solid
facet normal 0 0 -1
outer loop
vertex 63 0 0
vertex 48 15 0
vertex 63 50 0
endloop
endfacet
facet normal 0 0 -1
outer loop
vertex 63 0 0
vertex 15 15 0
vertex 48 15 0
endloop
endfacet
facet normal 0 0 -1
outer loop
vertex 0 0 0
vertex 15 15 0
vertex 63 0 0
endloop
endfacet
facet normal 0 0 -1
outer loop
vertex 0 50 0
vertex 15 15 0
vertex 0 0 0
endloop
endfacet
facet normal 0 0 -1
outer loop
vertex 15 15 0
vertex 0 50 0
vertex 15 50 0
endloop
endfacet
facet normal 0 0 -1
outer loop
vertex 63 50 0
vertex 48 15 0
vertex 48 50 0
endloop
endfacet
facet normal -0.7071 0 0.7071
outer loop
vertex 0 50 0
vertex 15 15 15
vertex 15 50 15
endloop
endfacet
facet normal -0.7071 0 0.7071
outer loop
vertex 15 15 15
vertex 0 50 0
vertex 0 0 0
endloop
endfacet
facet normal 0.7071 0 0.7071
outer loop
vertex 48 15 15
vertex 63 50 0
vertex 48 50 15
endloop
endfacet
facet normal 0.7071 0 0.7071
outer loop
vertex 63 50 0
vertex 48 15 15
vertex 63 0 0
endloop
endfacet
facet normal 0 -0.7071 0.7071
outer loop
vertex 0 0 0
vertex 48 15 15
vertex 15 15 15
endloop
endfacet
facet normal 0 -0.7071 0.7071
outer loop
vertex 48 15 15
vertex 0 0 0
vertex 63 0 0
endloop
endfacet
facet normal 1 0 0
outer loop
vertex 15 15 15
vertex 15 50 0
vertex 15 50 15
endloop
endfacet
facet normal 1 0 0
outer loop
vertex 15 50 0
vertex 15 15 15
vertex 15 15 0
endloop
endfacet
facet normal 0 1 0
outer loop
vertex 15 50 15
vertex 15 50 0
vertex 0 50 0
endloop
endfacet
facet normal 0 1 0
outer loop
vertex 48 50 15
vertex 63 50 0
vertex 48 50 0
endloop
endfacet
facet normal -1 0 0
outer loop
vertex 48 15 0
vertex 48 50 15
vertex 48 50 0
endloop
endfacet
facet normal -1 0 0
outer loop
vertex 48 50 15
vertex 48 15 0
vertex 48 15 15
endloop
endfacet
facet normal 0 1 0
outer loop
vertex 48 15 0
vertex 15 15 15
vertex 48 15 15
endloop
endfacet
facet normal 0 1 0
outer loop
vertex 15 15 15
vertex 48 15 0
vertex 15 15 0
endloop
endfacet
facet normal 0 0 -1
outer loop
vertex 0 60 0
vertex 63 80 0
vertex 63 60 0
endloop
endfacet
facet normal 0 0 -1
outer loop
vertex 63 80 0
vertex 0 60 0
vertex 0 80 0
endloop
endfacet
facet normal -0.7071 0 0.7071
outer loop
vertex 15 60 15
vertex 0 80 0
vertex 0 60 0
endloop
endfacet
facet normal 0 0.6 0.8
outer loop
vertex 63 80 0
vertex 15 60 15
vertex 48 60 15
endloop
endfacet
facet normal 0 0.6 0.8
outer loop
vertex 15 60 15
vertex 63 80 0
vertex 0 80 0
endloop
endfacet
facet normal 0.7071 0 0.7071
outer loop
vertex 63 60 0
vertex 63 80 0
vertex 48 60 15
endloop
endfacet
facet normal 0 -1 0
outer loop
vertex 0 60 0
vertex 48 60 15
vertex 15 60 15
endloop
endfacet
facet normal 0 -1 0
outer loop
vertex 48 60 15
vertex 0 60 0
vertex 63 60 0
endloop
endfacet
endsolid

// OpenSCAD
spacing = 1.5;
intX = 30 + 2*spacing;
intY = 32 + 2*spacing;

extX = 15 + intX + 15;
extY = 15 + intY + 20;

h = 15;


module support()
{
  polyhedron(
    points = [
               [0,    0,    0],
               [extX, 0,    0],
               [extX, extY, 0],
               [0,    extY, 0],
  
               [15,      15,      0],
               [15+intX, 15,      0],
               [15+intX, 15+intY, 0],
               [15,      15+intY, 0],
  
               [15,      15,      h],
               [15+intX, 15,      h],
               [15+intX, 15+intY, h],
               [15,      15+intY, h]
             ],

    faces = [
              // base
              [0, 4, 7],
              [0, 7, 3],
              [4, 0, 1],
              [5, 4, 1],
              [5, 1, 6],
              [6, 1, 2],
              [6, 2, 7],
              [7, 2, 3],

              // side walls
              [8,  0,  3],
              [3, 11,  8],
              [3,  2, 11],
              [2, 10, 11],
              [2,  9, 10],
              [2,  1,  9],
              [1,  0,  8],
              [9,  1,  8],

              // internal walls
              [7,  4, 11],
              [4,  8, 11],
              [6,  7, 11],
              [10, 6, 11],
              [5,  6, 10],
              [9,  5, 10],
              [4,  5,  8],
              [8,  5,  9]
            ]
  );
}

// part 1
difference()
{
  support();
  translate([0, extY-20, 0])
    cube([70, 20, 15]);
}


// part 2
translate([0, 10, 0])
  difference()
  {
    support();
    translate([0, 0, 0])
      cube([70, extY-20, 15]);
  }
